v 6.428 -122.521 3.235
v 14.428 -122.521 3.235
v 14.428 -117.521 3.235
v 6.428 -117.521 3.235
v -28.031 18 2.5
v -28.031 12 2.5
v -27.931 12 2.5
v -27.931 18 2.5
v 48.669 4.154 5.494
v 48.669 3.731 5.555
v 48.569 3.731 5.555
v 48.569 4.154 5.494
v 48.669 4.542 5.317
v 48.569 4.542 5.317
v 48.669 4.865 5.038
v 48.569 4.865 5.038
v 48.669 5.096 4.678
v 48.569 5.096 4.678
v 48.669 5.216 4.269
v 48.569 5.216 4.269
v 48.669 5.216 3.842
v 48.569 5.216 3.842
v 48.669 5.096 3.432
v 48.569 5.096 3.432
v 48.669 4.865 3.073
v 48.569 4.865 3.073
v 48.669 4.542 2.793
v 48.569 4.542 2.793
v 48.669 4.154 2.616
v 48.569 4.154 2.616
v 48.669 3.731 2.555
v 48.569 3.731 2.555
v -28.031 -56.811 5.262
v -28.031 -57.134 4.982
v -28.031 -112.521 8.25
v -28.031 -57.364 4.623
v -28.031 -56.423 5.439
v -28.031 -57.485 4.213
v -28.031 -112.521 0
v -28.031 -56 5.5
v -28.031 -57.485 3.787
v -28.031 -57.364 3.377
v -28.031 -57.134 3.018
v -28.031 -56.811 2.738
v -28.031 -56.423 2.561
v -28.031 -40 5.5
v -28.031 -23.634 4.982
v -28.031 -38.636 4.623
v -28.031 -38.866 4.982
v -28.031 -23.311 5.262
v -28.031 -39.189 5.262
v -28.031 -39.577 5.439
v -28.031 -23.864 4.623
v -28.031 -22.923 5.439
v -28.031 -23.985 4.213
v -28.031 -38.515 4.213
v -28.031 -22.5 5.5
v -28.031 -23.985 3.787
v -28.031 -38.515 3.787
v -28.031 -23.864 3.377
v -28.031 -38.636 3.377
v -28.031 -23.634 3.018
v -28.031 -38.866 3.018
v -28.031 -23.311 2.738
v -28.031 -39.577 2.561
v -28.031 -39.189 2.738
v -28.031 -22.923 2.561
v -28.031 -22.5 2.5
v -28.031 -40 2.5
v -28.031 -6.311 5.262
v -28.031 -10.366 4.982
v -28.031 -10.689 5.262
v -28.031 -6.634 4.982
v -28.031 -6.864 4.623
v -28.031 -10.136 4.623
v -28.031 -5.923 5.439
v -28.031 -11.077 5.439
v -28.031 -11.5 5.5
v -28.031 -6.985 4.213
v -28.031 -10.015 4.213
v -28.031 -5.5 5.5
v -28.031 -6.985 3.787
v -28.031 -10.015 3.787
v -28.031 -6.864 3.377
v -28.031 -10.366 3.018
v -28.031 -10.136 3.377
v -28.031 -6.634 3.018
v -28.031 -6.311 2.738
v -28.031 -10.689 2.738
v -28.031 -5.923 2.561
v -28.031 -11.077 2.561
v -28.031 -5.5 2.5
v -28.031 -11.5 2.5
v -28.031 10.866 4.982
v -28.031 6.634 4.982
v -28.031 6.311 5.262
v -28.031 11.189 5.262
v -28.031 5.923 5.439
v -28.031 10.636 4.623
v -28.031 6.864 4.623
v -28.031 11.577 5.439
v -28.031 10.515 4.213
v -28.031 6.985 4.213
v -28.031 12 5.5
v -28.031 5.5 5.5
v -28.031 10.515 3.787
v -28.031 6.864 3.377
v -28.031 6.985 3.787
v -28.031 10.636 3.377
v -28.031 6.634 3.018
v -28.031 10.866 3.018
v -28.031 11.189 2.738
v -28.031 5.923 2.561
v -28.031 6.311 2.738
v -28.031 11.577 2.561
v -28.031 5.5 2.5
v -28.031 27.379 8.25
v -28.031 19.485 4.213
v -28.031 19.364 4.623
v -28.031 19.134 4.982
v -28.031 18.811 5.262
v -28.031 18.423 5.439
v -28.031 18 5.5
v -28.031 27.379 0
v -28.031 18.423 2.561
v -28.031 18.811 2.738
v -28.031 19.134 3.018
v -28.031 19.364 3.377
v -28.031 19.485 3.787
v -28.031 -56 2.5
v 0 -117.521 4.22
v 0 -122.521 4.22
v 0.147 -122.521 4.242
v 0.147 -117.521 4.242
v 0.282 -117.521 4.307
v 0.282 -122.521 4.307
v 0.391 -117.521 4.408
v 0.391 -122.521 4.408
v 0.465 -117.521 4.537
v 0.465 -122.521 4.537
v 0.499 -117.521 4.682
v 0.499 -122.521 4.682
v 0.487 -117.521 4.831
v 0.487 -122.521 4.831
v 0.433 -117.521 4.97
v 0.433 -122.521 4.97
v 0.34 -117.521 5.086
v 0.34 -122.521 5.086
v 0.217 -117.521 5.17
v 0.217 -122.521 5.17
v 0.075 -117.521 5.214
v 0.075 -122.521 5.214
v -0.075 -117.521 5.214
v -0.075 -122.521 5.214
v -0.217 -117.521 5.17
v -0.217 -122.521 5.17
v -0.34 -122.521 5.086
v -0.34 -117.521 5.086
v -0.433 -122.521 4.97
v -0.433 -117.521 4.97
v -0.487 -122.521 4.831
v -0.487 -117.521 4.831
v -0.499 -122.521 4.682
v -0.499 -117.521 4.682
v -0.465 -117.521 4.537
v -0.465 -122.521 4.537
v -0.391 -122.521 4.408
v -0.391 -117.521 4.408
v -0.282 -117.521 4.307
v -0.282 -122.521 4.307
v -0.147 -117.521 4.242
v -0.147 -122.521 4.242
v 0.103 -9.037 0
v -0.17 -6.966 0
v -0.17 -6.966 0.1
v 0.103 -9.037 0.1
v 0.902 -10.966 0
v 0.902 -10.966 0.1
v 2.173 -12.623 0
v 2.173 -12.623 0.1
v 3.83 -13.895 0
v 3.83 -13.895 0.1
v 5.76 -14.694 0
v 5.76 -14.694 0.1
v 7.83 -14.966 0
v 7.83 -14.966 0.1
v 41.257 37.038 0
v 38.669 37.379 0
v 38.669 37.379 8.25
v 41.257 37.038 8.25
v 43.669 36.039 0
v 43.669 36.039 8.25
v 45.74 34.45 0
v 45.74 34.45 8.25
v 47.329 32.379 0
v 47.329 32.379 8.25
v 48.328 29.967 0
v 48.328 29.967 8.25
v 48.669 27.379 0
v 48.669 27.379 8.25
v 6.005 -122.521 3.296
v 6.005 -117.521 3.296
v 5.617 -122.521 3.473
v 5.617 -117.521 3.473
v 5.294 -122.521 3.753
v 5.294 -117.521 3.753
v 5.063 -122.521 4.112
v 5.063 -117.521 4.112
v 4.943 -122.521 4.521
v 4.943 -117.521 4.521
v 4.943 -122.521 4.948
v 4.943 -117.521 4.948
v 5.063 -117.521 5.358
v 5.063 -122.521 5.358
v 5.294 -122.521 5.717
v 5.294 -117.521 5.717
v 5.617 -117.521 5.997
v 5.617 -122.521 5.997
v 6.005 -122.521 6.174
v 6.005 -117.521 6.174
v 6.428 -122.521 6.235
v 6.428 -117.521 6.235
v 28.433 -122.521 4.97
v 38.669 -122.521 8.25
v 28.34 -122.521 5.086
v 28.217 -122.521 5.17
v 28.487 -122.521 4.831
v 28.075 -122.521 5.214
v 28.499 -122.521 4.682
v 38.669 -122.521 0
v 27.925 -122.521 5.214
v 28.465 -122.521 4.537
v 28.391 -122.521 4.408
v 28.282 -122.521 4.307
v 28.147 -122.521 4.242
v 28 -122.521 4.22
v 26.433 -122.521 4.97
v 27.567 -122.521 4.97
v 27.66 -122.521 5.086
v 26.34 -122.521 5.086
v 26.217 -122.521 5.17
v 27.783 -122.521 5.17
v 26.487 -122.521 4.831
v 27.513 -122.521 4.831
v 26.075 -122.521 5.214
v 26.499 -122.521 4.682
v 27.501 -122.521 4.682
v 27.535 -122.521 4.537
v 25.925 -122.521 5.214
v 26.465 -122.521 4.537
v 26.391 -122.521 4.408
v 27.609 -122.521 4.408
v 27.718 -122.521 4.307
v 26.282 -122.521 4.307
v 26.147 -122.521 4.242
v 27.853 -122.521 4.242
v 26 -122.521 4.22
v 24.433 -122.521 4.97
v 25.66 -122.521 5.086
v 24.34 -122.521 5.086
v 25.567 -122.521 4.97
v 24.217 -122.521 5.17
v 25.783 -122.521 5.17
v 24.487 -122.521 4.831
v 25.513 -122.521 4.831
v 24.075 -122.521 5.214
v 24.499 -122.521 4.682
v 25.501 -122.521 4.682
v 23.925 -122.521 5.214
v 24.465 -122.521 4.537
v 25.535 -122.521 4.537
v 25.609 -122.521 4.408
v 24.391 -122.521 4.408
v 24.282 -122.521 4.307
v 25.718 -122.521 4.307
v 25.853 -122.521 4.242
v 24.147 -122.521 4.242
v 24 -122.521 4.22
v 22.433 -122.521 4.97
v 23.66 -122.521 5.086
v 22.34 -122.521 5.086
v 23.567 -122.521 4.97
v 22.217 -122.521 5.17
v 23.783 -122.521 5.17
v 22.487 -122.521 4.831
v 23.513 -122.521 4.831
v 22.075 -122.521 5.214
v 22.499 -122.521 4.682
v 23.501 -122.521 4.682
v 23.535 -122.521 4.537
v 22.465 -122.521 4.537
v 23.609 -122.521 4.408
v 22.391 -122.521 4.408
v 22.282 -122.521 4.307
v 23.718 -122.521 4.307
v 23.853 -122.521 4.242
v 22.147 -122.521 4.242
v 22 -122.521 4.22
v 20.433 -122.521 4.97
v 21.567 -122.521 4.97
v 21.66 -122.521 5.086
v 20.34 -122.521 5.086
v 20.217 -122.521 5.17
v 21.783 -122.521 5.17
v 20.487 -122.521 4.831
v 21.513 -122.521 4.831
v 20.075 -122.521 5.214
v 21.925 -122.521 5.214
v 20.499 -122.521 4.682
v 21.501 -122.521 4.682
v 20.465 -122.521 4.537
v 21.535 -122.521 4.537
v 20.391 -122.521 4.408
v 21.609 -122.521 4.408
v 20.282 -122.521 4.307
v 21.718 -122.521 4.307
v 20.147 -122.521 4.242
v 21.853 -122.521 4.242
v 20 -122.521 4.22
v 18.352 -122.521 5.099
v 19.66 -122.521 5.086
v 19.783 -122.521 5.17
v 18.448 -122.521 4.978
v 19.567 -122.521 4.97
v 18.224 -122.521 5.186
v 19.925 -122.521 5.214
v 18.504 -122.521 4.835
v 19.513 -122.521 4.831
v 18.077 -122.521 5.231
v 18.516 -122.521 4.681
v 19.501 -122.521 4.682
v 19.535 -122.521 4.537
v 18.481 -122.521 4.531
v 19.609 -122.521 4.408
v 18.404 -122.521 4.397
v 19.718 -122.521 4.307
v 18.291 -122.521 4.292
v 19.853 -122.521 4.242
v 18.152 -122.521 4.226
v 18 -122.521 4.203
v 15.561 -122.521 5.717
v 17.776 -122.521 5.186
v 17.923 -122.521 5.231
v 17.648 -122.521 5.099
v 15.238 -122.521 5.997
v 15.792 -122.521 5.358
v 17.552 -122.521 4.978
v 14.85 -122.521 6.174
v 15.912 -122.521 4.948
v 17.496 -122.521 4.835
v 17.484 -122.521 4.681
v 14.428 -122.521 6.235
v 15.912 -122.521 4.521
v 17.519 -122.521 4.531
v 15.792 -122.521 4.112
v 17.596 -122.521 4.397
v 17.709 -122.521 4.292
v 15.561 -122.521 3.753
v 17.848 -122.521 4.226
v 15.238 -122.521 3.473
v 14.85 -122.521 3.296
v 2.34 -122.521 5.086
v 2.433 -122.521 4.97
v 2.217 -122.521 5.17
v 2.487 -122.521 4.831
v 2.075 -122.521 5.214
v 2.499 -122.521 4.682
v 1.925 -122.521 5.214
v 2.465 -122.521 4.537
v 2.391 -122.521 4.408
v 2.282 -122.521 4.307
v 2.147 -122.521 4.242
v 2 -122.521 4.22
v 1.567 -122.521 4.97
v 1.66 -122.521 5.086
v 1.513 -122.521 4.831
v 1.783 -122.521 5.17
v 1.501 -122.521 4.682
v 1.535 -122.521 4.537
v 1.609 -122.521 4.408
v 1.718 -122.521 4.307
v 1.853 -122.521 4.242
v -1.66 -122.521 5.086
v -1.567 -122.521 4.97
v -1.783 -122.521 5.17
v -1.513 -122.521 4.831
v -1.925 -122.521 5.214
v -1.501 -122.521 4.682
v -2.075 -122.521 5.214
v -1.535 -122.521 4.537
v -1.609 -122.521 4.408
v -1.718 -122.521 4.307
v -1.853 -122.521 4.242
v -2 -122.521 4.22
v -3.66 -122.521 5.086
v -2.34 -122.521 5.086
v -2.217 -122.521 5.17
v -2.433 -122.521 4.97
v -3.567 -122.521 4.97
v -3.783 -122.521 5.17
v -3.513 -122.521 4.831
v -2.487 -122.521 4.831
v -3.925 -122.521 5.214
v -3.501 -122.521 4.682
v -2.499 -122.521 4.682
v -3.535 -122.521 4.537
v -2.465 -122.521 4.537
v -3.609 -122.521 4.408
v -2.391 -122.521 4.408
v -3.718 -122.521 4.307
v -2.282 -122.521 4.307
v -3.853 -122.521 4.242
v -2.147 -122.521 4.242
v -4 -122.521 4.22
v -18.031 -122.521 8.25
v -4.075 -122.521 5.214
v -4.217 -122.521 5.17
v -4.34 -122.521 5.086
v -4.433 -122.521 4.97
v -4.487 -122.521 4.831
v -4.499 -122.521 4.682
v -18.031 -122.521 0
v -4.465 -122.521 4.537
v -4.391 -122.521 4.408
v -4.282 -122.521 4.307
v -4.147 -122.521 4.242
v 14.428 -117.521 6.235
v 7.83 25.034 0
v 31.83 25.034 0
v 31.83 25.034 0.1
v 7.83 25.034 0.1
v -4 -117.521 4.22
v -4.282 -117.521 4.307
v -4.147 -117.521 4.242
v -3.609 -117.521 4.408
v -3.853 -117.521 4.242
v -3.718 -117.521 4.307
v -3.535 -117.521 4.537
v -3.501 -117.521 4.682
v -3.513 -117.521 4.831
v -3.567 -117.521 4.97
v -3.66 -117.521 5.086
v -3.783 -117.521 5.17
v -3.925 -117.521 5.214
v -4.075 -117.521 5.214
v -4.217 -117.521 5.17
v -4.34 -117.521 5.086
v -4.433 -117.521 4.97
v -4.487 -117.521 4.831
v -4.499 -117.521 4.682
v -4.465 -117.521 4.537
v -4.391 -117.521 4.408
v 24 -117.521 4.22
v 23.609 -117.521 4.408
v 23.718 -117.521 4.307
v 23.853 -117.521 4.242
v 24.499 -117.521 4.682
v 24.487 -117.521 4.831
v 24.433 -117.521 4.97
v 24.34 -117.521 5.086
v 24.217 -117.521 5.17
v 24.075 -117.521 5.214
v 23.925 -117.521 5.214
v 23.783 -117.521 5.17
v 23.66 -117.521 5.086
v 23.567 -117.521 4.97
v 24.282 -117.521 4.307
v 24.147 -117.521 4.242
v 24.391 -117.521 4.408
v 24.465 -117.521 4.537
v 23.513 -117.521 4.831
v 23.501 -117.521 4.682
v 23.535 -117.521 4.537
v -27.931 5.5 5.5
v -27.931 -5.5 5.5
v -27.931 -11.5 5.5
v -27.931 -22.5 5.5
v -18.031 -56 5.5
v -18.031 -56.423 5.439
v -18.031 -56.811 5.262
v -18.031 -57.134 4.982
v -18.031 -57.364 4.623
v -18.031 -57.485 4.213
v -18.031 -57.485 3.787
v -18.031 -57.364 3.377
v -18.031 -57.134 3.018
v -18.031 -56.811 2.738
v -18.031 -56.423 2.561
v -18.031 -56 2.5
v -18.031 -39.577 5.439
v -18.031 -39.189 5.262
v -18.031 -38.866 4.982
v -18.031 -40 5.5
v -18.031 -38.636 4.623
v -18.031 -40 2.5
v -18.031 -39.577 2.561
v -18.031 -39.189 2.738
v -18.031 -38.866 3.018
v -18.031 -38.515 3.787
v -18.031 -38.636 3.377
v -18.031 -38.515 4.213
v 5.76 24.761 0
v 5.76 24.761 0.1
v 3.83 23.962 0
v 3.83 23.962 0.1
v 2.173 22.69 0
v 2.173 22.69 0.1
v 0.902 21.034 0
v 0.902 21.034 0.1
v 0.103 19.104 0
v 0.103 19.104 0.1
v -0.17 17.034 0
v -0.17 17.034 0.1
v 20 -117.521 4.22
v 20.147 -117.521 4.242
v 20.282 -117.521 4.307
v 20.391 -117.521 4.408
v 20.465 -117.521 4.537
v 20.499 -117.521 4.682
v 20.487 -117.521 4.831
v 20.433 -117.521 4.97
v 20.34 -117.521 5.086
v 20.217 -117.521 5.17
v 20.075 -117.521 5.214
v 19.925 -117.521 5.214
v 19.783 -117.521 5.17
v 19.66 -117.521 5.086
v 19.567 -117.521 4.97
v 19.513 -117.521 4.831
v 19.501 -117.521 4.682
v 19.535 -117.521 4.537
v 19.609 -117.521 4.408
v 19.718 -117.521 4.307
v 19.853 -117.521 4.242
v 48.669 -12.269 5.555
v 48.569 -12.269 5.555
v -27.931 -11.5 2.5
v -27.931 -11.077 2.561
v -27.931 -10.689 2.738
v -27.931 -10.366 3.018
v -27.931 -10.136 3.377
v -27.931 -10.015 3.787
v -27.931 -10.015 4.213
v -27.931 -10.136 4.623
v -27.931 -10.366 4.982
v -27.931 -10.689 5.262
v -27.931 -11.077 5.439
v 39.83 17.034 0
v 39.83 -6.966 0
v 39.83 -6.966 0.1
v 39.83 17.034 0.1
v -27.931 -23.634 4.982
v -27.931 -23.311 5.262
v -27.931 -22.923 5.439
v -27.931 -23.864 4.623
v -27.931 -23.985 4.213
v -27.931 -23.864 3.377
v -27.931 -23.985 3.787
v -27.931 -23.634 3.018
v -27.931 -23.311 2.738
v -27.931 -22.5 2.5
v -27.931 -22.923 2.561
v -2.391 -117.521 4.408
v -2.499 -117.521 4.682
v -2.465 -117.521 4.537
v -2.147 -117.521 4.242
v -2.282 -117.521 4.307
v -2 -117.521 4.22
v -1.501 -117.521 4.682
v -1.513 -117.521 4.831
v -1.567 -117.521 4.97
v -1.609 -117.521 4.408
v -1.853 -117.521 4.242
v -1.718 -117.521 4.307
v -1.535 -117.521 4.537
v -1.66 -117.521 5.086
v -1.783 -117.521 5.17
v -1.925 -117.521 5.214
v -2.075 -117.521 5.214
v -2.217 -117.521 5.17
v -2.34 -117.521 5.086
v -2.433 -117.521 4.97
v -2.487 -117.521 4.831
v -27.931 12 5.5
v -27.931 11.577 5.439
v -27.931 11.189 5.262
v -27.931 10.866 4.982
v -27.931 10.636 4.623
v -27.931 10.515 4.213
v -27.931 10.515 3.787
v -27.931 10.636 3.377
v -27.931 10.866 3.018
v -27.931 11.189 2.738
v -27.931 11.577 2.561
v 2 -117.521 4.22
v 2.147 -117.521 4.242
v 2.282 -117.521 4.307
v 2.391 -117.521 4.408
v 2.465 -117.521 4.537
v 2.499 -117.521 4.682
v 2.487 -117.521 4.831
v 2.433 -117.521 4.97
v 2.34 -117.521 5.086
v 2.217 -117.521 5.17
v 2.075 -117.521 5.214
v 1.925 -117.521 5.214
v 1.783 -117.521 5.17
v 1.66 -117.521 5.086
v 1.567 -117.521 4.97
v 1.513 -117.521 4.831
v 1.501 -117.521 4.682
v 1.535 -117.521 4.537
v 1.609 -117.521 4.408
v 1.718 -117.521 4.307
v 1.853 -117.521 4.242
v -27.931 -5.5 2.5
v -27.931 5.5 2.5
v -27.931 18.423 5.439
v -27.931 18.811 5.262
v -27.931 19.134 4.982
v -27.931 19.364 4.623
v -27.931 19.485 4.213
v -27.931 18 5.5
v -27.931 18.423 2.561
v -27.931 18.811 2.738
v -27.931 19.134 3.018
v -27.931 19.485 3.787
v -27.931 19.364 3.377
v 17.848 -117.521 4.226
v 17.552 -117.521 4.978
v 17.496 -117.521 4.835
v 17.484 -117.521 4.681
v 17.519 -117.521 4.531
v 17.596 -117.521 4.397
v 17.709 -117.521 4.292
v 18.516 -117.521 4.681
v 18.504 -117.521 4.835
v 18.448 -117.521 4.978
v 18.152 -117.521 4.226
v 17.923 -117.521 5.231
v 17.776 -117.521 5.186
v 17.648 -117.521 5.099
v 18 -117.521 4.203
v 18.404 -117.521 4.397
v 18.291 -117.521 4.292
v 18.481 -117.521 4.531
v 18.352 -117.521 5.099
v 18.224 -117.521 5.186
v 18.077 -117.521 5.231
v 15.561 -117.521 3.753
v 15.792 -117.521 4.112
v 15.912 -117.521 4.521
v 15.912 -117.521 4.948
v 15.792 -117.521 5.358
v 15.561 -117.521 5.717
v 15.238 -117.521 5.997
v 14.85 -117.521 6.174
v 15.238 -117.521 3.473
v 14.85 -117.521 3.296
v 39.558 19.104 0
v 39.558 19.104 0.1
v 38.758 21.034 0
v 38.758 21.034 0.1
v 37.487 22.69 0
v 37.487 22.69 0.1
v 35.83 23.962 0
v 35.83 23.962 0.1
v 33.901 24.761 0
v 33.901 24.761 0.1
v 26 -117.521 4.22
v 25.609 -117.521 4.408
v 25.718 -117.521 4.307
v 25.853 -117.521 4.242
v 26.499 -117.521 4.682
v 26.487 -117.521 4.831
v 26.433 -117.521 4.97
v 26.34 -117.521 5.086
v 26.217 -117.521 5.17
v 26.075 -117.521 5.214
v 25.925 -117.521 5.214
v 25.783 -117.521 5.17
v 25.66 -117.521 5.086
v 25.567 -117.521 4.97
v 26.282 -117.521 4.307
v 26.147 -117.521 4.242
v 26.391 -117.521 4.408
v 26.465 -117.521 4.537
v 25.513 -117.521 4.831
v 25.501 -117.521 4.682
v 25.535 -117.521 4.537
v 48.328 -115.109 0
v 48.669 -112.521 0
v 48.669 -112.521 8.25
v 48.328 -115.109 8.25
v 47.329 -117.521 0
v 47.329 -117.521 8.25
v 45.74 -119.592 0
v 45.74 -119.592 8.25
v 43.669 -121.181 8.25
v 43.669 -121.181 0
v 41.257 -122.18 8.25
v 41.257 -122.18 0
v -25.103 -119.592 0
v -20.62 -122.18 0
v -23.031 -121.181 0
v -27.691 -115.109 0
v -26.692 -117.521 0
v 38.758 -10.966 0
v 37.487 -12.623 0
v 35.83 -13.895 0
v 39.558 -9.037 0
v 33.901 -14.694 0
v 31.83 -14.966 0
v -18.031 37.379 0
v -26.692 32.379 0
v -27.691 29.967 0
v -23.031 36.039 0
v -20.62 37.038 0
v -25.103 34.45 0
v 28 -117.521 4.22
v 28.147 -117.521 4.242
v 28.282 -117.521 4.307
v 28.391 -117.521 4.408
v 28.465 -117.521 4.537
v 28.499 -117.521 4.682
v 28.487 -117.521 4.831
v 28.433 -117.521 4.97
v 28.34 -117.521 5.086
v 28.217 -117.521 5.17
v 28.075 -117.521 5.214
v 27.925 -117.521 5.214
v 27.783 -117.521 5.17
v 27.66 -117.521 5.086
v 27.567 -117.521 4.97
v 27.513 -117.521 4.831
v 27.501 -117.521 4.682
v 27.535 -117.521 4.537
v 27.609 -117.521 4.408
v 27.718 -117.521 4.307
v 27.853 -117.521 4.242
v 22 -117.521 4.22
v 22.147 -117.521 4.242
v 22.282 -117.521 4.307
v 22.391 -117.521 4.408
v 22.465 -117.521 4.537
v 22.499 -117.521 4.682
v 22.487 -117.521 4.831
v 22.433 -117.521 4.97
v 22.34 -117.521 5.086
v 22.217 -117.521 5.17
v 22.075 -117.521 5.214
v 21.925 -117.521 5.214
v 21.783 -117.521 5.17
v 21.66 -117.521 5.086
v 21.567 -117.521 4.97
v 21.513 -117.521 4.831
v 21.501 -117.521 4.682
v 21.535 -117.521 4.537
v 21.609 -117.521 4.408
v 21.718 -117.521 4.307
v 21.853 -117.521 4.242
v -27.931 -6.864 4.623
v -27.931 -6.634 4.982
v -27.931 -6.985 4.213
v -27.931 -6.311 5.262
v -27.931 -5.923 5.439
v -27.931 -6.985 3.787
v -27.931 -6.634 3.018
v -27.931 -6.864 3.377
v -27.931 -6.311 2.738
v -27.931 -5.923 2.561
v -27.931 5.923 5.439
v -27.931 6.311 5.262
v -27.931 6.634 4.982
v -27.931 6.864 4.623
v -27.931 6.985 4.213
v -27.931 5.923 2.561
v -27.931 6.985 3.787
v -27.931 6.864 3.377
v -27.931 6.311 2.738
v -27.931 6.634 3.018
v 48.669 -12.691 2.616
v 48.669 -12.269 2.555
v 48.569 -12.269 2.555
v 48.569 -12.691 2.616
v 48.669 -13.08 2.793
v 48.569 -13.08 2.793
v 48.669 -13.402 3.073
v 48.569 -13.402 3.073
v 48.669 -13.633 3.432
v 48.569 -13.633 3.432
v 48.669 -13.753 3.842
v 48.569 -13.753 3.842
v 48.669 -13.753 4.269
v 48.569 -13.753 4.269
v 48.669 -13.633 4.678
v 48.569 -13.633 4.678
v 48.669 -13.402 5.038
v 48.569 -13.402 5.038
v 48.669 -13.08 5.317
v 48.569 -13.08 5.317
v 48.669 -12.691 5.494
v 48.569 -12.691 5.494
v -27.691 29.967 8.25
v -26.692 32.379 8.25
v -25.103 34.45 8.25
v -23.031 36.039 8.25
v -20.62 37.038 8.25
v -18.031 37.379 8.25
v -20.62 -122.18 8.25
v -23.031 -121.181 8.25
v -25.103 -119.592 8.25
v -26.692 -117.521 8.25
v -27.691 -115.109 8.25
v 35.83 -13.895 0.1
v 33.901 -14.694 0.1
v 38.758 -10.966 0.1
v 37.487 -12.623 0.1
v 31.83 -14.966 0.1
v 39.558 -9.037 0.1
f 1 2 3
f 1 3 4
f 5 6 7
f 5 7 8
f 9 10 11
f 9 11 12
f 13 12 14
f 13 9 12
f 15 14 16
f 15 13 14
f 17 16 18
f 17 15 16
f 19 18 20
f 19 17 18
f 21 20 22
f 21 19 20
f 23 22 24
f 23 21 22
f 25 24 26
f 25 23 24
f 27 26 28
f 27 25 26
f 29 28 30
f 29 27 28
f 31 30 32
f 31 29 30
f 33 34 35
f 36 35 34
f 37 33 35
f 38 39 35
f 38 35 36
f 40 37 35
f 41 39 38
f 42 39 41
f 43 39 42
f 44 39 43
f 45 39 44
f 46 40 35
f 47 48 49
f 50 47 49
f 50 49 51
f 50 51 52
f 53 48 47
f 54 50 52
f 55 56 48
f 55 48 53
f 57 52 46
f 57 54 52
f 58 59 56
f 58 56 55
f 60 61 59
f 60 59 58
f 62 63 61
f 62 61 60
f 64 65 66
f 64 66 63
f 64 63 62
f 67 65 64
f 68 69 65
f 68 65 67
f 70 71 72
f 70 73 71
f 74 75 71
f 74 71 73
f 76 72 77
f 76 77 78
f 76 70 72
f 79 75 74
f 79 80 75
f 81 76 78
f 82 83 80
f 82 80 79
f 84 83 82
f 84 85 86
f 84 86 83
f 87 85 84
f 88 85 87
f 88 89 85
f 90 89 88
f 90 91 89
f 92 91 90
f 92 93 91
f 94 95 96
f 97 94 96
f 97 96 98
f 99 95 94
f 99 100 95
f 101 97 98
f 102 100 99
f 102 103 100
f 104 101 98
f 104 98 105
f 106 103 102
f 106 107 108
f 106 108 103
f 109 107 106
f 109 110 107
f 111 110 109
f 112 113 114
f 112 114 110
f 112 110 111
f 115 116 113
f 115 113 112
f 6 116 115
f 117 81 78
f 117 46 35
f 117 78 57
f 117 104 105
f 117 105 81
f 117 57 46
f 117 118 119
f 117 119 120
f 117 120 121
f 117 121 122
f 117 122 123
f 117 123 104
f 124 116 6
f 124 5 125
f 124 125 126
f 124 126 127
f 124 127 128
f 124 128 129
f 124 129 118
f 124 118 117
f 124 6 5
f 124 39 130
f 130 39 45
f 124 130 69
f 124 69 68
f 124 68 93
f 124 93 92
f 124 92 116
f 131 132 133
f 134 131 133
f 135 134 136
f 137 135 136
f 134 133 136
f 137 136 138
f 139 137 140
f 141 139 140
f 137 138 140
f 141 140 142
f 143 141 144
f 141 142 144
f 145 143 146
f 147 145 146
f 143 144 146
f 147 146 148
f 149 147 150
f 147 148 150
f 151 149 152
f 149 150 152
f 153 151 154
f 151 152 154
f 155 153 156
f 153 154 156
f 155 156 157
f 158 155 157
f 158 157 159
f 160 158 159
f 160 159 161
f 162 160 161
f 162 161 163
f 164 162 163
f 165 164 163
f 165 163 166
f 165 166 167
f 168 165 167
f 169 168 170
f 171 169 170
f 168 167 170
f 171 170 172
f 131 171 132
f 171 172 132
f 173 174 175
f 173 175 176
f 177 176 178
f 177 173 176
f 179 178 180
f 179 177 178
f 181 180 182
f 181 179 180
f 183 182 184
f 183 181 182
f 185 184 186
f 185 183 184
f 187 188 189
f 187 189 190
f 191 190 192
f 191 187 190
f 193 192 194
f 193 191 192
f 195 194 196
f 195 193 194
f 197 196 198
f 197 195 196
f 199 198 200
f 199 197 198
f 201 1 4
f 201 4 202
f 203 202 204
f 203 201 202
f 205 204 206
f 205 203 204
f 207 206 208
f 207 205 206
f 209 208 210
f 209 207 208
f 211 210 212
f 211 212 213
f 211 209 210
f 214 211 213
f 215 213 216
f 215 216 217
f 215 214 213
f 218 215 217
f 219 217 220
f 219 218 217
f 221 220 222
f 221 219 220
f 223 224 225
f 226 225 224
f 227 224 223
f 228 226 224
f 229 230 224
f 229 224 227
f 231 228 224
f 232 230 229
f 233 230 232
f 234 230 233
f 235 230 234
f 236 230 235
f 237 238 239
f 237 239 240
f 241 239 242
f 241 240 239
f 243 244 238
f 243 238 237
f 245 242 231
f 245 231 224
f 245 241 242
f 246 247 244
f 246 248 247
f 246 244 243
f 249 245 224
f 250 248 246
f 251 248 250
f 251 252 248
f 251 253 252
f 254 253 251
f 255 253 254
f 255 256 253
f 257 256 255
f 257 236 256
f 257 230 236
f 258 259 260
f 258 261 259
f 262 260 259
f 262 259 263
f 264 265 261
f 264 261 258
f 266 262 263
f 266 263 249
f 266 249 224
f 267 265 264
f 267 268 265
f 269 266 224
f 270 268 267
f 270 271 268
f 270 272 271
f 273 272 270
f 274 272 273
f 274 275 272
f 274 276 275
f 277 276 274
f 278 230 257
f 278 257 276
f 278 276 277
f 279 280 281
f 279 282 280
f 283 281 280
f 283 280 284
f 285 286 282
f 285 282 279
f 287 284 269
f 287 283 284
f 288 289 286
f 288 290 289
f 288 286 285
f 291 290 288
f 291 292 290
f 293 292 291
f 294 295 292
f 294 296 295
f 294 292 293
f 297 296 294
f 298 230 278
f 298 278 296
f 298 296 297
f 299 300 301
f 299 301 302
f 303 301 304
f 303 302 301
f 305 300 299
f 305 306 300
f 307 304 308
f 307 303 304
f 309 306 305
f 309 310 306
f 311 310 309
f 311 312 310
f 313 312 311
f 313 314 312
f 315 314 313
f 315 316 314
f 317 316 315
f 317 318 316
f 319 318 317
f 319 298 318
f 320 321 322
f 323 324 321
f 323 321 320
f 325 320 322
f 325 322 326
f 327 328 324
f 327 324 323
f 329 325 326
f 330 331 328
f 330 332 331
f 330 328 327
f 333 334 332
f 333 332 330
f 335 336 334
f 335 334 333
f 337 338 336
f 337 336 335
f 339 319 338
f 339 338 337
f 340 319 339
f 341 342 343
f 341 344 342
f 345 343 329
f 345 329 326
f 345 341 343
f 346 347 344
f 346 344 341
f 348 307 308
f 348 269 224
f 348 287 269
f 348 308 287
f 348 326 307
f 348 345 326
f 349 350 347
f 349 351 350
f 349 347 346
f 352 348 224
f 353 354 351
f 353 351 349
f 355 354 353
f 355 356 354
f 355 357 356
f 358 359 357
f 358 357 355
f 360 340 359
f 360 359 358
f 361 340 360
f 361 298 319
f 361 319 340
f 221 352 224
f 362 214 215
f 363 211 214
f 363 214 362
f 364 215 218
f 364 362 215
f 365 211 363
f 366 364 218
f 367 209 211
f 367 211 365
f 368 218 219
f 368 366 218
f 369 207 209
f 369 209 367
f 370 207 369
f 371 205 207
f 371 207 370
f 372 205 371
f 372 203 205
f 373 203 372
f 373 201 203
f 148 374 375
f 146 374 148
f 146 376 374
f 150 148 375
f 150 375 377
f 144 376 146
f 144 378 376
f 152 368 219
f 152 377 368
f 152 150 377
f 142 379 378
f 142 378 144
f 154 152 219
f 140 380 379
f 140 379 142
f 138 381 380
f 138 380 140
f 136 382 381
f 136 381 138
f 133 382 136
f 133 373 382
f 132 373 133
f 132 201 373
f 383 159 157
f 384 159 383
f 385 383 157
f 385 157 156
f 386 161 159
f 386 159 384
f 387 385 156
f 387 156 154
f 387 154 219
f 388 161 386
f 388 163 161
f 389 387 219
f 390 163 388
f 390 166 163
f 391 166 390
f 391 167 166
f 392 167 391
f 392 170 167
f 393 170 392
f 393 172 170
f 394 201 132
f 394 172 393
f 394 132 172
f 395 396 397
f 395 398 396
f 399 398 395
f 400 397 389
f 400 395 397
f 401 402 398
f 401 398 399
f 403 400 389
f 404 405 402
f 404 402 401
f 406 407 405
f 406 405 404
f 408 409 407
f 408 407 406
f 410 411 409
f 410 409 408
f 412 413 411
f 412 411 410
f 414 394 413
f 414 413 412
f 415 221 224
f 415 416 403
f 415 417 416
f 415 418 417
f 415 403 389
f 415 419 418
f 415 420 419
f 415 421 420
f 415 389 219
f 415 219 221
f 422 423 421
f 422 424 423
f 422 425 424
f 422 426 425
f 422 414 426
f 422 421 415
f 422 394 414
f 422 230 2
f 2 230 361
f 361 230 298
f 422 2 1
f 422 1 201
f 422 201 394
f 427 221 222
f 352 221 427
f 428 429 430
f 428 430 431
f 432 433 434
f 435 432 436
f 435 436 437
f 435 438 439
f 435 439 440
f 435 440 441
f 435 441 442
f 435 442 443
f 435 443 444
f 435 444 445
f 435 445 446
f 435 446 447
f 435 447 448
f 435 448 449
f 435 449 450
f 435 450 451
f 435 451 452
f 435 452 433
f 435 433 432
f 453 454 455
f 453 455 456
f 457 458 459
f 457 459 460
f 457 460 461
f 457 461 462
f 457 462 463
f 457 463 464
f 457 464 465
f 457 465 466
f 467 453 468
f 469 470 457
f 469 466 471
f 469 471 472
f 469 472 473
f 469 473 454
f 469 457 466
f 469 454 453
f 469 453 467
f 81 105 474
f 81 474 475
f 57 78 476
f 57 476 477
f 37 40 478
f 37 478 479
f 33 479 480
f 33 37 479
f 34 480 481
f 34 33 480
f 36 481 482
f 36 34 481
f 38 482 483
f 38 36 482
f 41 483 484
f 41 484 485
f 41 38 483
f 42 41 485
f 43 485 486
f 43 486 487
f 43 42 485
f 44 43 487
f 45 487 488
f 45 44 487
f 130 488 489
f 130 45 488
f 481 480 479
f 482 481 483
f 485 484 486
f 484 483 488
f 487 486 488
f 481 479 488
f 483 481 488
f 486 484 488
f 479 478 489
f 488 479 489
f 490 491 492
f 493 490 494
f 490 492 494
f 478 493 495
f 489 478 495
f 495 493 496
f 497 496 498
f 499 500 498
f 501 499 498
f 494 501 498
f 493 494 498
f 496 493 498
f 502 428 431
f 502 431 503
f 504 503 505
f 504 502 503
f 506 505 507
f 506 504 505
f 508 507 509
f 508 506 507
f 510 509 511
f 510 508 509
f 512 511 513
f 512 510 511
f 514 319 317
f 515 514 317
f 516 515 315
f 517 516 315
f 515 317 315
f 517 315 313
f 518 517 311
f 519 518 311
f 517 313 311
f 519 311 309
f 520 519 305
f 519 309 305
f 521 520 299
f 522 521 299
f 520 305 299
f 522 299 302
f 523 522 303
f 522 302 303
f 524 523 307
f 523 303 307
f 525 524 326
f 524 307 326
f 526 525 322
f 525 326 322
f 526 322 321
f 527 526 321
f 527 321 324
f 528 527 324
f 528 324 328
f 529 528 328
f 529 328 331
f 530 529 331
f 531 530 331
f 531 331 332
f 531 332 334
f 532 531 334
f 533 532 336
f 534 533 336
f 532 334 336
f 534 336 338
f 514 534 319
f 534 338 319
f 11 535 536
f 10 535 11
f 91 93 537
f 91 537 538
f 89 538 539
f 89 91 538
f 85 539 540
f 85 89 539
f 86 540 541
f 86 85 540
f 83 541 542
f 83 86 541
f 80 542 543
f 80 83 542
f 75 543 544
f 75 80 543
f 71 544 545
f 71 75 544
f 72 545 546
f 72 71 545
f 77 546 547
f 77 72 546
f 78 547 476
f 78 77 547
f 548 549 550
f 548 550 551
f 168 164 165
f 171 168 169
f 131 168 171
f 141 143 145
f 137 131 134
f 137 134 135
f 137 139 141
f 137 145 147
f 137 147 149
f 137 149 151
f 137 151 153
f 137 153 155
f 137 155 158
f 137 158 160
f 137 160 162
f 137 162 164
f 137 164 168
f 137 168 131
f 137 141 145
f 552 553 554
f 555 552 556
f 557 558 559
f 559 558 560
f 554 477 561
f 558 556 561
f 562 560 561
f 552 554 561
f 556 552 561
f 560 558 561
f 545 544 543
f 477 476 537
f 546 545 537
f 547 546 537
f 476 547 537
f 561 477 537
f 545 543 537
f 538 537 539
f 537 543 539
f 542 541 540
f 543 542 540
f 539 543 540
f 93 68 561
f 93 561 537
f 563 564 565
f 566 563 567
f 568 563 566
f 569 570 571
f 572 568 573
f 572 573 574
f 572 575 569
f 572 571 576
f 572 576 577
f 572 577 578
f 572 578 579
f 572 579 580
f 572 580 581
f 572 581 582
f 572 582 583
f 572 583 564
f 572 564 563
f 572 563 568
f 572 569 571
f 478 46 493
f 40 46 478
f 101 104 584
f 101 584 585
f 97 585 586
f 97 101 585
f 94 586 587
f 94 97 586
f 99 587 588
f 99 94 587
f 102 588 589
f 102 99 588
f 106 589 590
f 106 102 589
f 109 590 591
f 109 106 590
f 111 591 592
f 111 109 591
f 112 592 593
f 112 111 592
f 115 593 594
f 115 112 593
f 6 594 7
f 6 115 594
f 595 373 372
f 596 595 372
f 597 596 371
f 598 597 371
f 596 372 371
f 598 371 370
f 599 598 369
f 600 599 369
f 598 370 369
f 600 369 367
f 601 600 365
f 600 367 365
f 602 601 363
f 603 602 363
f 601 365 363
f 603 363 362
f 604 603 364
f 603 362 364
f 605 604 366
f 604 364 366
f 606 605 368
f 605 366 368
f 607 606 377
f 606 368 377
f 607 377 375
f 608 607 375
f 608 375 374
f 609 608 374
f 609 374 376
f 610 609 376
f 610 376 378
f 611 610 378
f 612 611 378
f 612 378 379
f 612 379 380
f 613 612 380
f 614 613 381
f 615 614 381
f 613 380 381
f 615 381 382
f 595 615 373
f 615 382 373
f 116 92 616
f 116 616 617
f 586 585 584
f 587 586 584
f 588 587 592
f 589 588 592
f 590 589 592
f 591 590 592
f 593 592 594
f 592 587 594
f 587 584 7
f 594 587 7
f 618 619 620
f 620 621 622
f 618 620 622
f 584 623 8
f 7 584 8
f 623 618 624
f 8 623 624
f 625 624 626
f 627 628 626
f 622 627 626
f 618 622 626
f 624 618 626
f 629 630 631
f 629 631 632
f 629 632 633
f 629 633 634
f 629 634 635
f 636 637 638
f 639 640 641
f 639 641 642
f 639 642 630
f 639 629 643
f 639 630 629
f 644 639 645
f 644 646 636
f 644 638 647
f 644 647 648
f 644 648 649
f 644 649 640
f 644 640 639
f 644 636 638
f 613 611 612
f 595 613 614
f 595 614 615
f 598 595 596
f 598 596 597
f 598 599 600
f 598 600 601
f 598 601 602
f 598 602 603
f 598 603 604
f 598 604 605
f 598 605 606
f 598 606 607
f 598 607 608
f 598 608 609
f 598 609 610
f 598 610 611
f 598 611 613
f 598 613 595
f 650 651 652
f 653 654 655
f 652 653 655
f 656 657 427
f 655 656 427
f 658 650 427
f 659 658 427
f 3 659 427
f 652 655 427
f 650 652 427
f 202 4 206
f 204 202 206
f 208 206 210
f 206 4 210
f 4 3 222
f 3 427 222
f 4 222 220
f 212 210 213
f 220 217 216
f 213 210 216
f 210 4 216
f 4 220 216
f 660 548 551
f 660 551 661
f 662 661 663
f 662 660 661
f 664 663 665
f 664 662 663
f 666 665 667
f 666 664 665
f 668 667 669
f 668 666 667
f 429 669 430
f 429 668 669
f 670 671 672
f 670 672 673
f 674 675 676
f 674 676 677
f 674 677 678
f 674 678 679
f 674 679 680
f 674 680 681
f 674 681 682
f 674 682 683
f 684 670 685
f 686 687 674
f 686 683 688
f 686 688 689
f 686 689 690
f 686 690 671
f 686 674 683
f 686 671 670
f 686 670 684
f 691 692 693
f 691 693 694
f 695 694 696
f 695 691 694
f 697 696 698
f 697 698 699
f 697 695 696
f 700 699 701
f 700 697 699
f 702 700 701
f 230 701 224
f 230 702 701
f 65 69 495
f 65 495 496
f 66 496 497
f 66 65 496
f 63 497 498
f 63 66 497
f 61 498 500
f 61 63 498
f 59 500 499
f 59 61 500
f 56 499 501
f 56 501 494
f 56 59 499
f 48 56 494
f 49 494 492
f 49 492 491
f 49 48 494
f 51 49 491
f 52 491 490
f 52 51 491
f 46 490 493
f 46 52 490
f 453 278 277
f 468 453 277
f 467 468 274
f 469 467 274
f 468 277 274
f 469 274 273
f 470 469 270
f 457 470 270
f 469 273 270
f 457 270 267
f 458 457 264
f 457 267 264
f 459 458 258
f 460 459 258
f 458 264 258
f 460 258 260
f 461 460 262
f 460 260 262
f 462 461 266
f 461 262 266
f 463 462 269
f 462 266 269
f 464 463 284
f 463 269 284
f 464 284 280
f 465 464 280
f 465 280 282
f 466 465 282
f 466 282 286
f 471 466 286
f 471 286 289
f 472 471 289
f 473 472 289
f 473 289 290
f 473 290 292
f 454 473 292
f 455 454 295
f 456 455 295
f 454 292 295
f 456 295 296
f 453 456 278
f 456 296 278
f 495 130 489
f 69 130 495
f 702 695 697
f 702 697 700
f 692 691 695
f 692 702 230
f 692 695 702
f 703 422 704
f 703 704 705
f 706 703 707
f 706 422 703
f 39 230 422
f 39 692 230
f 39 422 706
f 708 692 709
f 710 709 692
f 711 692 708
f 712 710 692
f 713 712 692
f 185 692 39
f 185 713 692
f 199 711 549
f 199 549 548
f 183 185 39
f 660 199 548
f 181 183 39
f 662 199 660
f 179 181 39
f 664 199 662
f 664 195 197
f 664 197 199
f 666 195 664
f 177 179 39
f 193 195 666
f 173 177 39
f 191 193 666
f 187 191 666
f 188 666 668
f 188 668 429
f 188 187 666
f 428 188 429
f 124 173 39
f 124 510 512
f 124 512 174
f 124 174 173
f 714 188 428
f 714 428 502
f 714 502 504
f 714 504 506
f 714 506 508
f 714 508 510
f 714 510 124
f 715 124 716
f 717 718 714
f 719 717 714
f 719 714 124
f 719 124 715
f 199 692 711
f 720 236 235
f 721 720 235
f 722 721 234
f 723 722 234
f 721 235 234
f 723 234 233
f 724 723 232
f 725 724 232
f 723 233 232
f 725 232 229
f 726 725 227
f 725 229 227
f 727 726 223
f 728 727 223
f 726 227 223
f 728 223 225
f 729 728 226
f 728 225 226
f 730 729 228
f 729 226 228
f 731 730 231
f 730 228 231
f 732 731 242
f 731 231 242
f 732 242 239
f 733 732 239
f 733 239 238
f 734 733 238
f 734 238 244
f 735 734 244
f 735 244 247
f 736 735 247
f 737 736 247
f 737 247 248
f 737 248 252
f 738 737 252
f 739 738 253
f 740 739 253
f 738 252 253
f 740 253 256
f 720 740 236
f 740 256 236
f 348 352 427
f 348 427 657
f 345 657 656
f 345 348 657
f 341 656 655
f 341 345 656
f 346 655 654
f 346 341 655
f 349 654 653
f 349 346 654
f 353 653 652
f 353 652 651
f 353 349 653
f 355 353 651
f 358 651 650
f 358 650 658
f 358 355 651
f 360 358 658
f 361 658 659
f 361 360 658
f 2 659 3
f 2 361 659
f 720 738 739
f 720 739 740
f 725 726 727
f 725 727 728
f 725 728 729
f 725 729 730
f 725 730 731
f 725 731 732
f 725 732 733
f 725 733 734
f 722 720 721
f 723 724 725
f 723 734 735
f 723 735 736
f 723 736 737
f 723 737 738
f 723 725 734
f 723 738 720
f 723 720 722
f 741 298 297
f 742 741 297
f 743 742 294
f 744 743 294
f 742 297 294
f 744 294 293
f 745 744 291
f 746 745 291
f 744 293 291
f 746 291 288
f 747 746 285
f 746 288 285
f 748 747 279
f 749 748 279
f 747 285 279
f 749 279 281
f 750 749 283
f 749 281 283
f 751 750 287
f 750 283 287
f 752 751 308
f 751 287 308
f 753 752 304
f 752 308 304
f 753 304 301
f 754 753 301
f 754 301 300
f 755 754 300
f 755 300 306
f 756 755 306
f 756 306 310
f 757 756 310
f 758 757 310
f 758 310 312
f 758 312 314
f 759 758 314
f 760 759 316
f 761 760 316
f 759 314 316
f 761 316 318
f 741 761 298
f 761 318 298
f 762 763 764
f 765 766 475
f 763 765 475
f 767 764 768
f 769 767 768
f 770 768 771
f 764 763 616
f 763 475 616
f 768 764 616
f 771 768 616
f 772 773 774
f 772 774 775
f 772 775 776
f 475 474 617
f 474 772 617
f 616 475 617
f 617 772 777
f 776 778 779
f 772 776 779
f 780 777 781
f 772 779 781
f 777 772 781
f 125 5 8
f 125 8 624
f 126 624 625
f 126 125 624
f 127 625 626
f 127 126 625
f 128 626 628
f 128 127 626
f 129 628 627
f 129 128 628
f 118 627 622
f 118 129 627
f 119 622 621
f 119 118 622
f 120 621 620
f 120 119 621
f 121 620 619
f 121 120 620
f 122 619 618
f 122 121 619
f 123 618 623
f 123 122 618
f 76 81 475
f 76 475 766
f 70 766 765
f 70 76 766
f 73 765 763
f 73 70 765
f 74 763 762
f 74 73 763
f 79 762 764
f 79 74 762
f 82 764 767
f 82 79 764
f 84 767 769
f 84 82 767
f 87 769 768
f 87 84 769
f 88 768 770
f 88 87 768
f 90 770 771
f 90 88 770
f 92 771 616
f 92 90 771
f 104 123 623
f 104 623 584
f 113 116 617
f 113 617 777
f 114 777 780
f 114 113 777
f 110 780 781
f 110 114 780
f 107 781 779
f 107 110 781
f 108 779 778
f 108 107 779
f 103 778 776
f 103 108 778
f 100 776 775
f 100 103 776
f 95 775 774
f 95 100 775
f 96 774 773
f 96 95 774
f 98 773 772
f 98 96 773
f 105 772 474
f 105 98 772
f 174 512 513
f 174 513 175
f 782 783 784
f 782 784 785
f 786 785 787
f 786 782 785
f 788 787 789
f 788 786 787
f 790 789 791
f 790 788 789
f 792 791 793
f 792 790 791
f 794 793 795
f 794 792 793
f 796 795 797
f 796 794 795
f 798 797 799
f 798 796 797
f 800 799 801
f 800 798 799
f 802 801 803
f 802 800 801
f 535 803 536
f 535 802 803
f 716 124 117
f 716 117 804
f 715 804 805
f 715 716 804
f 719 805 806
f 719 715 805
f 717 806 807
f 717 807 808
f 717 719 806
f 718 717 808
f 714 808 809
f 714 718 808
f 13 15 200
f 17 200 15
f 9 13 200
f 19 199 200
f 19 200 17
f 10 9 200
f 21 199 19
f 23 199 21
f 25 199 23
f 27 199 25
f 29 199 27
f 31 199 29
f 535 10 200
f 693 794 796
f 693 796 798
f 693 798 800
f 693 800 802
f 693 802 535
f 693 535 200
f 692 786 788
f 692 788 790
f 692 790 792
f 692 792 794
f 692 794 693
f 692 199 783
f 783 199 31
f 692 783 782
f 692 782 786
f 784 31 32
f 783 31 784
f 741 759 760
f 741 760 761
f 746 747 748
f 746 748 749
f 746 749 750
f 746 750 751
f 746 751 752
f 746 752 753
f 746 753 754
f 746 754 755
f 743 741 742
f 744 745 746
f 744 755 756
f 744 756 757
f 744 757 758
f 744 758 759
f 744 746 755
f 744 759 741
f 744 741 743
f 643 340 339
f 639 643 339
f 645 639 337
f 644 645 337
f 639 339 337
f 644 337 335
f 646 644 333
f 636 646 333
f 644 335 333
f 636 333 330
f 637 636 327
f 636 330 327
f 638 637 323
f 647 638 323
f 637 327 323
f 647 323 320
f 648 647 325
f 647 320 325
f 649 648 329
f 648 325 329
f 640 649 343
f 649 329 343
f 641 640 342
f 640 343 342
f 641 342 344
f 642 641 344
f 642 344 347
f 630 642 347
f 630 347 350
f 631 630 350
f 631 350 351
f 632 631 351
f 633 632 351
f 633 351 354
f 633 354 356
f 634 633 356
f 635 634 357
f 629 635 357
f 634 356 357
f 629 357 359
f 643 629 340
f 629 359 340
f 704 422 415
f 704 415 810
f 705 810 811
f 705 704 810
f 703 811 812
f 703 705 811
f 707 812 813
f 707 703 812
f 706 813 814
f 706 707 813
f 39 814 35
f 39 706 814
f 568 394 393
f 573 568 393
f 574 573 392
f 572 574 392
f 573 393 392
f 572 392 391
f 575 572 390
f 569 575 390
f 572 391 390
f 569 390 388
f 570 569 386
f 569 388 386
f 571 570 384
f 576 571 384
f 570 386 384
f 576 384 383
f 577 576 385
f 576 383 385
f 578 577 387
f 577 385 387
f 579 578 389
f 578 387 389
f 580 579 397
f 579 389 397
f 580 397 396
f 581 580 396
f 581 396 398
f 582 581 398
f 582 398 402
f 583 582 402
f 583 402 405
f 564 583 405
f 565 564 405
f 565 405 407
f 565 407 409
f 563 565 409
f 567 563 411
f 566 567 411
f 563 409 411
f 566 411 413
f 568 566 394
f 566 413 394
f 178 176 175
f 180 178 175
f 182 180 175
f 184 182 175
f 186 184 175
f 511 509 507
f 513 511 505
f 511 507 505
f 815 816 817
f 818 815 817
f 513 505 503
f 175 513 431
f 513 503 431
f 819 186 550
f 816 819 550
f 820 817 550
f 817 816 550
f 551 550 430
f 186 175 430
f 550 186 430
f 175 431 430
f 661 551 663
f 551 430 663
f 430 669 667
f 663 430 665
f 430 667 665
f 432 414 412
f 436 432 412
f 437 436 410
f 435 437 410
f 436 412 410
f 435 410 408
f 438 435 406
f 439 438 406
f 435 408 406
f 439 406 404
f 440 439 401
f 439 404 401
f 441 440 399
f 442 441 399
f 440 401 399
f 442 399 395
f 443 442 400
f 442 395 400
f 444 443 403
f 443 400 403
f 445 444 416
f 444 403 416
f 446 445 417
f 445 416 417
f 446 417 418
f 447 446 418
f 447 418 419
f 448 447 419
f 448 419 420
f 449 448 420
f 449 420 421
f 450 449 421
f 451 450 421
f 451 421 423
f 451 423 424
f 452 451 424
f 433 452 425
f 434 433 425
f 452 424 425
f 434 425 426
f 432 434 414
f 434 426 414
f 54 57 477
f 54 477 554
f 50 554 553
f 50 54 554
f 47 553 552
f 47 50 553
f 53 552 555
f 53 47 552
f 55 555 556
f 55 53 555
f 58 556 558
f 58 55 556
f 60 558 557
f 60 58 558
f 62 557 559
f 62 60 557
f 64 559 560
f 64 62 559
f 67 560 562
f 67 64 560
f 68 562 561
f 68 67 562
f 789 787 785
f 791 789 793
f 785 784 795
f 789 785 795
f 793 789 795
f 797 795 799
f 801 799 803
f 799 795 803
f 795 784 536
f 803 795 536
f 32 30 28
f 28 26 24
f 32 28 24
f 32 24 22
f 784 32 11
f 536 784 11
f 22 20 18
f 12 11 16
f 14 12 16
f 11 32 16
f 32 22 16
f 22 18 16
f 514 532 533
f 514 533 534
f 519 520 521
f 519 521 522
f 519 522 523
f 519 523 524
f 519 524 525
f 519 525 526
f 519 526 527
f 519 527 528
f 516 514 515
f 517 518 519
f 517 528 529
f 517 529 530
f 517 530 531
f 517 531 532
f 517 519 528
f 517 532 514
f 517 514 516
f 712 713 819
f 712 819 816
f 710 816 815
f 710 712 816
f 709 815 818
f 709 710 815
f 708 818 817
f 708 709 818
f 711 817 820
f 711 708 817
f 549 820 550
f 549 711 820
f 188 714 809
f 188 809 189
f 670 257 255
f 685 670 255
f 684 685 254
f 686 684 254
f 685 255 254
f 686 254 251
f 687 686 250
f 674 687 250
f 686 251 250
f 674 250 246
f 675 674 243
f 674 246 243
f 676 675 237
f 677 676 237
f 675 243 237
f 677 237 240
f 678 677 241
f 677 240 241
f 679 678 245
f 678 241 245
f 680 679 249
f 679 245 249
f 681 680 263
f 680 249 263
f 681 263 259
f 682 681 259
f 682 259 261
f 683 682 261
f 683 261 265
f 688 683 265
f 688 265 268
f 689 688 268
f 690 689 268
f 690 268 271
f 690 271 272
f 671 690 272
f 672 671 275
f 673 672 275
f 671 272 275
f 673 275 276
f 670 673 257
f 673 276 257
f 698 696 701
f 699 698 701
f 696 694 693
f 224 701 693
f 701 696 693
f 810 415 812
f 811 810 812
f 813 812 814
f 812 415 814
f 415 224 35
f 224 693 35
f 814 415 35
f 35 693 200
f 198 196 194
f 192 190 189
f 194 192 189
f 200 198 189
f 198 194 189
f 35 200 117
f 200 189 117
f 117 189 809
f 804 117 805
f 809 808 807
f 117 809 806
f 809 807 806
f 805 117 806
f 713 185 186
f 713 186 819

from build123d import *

# Parameters (mm, degrees)
EXTRUDE_1_DEPTH     = 8.25
CUT_EXTRUDE_1_DEPTH = 5
SKETCH_4_R          = 0.5
SKETCH_4_R_2        = 0.517195783
CUT_EXTRUDE_2_DEPTH = 5
CUT_EXTRUDE_3_DEPTH = 0.1
SKETCH_6_R          = 0.157252924
CUT_EXTRUDE_4_DEPTH = 0.1
CUT_EXTRUDE_5_DEPTH = 0.1
CUT_EXTRUDE_6_DEPTH = 0.1
CUT_EXTRUDE_7_DEPTH = 10


with BuildPart() as part:
    # 草图1 → 凸台-拉伸1 (new body)
    with BuildSketch(Plane.XY):
        with BuildLine():
            Line((-18.031435036, 37.379055707), (38.668564964, 37.379055707))
            ThreePointArc((38.668564964, 37.379055707), (45.739632776, 34.450123519), (48.668564964, 27.379055707))
            Line((48.668564964, 27.379055707), (48.668564964, -112.520944293))
            ThreePointArc((48.668564964, -112.520944293), (45.739632776, -119.592012105), (38.668564964, -122.520944293))
            Line((38.668564964, -122.520944293), (-18.031435036, -122.520944293))
            ThreePointArc((-18.031435036, -122.520944293), (-25.102502847, -119.592012105), (-28.031435036, -112.520944293))
            Line((-28.031435036, -112.520944293), (-28.031435036, 27.379055707))
            ThreePointArc((-28.031435036, 27.379055707), (-25.102502847, 34.450123519), (-18.031435036, 37.379055707))
        make_face()
    extrude(amount=EXTRUDE_1_DEPTH)

    # 草图2 → 切除-拉伸1 (cut)
    with BuildSketch(Plane.XZ.offset(122.520944293)):
        with BuildLine():
            Line((6.427510461, 6.234889493), (14.427510461, 6.234889493))
            ThreePointArc((14.427510461, 6.234889493), (15.927510461, 4.734889493), (14.427510461, 3.234889493))
            Line((14.427510461, 3.234889493), (6.427510461, 3.234889493))
            ThreePointArc((6.427510461, 3.234889493), (4.927510461, 4.734889493), (6.427510461, 6.234889493))
        make_face()
    extrude(amount=-CUT_EXTRUDE_1_DEPTH, mode=Mode.SUBTRACT)

    # 草图4 → 切除-拉伸2 (cut)
    with BuildSketch(Plane.XZ.offset(122.520944293)):
        with Locations(Location((2, 4.719775151, 0), (0, 0, 270))):
            Circle(SKETCH_4_R)
        with Locations(Location((0, 4.71977515, 0), (0, 0, 270))):
            Circle(SKETCH_4_R)
        with Locations(Location((-2, 4.71977515, 0), (0, 0, 270))):
            Circle(SKETCH_4_R)
        with Locations(Location((-4, 4.71977515, 0), (0, 0, 270))):
            Circle(SKETCH_4_R)
        with Locations(Location((18, 4.71977515, 0), (0, 0, 270))):
            Circle(SKETCH_4_R_2)
        with Locations(Location((20, 4.71977515, 0), (0, 0, 270))):
            Circle(SKETCH_4_R)
        with Locations(Location((22, 4.71977515, 0), (0, 0, 270))):
            Circle(SKETCH_4_R)
        with Locations(Location((24, 4.71977515, 0), (0, 0, 270))):
            Circle(SKETCH_4_R)
        with Locations(Location((26, 4.71977515, 0), (0, 0, 270))):
            Circle(SKETCH_4_R)
        with Locations(Location((28, 4.71977515, 0), (0, 0, 270))):
            Circle(SKETCH_4_R)
    extrude(amount=-CUT_EXTRUDE_2_DEPTH, mode=Mode.SUBTRACT)

    # 草图5 → 切除-拉伸3 (cut)
    with BuildSketch(Plane(origin=(48.668564964, 0, 0), x_dir=(0, 0, -1), z_dir=(1, 0, 0))):
        with BuildLine():
            Line((-2.555232712, 3.731296592), (-2.555232712, -12.268703408))
            ThreePointArc((-2.555232712, -12.268703408), (-4.055232712, -13.768703408), (-5.555232712, -12.268703408))
            Line((-5.555232712, -12.268703408), (-5.555232712, 3.731296592))
            ThreePointArc((-5.555232712, 3.731296592), (-4.055232712, 5.231296592), (-2.555232712, 3.731296592))
        make_face()
    extrude(amount=-CUT_EXTRUDE_3_DEPTH, mode=Mode.SUBTRACT)

    # 草图6 → 切除-拉伸4 (cut)
    with BuildSketch(Plane.ZY.offset(28.031435036)):
        with Locations(Location((4.361987168, 13.879950774, 0), (0, 0, 270))):
            Circle(SKETCH_6_R)
        with BuildLine():
            Line((5.5, -11.5), (5.5, -22.5))
            ThreePointArc((5.5, -22.5), (4, -24), (2.5, -22.5))
            Line((2.5, -22.5), (2.5, -11.5))
            ThreePointArc((2.5, -11.5), (4, -10), (5.5, -11.5))
        make_face()
        with BuildLine():
            Line((5.5, 5.5), (5.5, -5.5))
            ThreePointArc((5.5, -5.5), (4, -7), (2.5, -5.5))
            Line((2.5, -5.5), (2.5, 5.5))
            ThreePointArc((2.5, 5.5), (4, 7), (5.5, 5.5))
        make_face()
    extrude(amount=-CUT_EXTRUDE_4_DEPTH, mode=Mode.SUBTRACT)

    # 草图9 → 切除-拉伸5 (cut)
    with BuildSketch(Plane.ZY.offset(28.031435036)):
        with BuildLine():
            Line((5.5, 18), (5.5, 12))
            ThreePointArc((5.5, 12), (4, 10.5), (2.5, 12))
            Line((2.5, 12), (2.5, 18))
            ThreePointArc((2.5, 18), (4, 19.5), (5.5, 18))
        make_face()
    extrude(amount=-CUT_EXTRUDE_5_DEPTH, mode=Mode.SUBTRACT)

    # 草图10 → 切除-拉伸6 (cut)
    with BuildSketch(Plane(origin=(0, 0, 0), x_dir=(-1, 0, 0), z_dir=(0, 0, -1))):
        with BuildLine():
            Line((-31.830127614, 25.033557379), (-7.830127614, 25.033557379))
            ThreePointArc((-7.830127614, 25.033557379), (-2.173273364, 22.690411628), (0.169872386, 17.033557379))
            Line((0.169872386, 17.033557379), (0.169872386, -6.966442621))
            ThreePointArc((0.169872386, -6.966442621), (-2.173273364, -12.623296871), (-7.830127614, -14.966442621))
            Line((-7.830127614, -14.966442621), (-31.830127614, -14.966442621))
            ThreePointArc((-31.830127614, -14.966442621), (-37.486981863, -12.623296871), (-39.830127614, -6.966442621))
            Line((-39.830127614, -6.966442621), (-39.830127614, 17.033557379))
            ThreePointArc((-39.830127614, 17.033557379), (-37.486981863, 22.690411628), (-31.830127614, 25.033557379))
        make_face()
    extrude(amount=-CUT_EXTRUDE_6_DEPTH, mode=Mode.SUBTRACT)

    # 草图11 → 切除-拉伸7 (cut)
    with BuildSketch(Plane.ZY.offset(28.031435036)):
        with BuildLine():
            Line((5.5, -40), (5.5, -56))
            ThreePointArc((5.5, -56), (4, -57.5), (2.5, -56))
            Line((2.5, -56), (2.5, -40))
            ThreePointArc((2.5, -40), (4, -38.5), (5.5, -40))
        make_face()
    extrude(amount=-CUT_EXTRUDE_7_DEPTH, mode=Mode.SUBTRACT)


solid = part.part
